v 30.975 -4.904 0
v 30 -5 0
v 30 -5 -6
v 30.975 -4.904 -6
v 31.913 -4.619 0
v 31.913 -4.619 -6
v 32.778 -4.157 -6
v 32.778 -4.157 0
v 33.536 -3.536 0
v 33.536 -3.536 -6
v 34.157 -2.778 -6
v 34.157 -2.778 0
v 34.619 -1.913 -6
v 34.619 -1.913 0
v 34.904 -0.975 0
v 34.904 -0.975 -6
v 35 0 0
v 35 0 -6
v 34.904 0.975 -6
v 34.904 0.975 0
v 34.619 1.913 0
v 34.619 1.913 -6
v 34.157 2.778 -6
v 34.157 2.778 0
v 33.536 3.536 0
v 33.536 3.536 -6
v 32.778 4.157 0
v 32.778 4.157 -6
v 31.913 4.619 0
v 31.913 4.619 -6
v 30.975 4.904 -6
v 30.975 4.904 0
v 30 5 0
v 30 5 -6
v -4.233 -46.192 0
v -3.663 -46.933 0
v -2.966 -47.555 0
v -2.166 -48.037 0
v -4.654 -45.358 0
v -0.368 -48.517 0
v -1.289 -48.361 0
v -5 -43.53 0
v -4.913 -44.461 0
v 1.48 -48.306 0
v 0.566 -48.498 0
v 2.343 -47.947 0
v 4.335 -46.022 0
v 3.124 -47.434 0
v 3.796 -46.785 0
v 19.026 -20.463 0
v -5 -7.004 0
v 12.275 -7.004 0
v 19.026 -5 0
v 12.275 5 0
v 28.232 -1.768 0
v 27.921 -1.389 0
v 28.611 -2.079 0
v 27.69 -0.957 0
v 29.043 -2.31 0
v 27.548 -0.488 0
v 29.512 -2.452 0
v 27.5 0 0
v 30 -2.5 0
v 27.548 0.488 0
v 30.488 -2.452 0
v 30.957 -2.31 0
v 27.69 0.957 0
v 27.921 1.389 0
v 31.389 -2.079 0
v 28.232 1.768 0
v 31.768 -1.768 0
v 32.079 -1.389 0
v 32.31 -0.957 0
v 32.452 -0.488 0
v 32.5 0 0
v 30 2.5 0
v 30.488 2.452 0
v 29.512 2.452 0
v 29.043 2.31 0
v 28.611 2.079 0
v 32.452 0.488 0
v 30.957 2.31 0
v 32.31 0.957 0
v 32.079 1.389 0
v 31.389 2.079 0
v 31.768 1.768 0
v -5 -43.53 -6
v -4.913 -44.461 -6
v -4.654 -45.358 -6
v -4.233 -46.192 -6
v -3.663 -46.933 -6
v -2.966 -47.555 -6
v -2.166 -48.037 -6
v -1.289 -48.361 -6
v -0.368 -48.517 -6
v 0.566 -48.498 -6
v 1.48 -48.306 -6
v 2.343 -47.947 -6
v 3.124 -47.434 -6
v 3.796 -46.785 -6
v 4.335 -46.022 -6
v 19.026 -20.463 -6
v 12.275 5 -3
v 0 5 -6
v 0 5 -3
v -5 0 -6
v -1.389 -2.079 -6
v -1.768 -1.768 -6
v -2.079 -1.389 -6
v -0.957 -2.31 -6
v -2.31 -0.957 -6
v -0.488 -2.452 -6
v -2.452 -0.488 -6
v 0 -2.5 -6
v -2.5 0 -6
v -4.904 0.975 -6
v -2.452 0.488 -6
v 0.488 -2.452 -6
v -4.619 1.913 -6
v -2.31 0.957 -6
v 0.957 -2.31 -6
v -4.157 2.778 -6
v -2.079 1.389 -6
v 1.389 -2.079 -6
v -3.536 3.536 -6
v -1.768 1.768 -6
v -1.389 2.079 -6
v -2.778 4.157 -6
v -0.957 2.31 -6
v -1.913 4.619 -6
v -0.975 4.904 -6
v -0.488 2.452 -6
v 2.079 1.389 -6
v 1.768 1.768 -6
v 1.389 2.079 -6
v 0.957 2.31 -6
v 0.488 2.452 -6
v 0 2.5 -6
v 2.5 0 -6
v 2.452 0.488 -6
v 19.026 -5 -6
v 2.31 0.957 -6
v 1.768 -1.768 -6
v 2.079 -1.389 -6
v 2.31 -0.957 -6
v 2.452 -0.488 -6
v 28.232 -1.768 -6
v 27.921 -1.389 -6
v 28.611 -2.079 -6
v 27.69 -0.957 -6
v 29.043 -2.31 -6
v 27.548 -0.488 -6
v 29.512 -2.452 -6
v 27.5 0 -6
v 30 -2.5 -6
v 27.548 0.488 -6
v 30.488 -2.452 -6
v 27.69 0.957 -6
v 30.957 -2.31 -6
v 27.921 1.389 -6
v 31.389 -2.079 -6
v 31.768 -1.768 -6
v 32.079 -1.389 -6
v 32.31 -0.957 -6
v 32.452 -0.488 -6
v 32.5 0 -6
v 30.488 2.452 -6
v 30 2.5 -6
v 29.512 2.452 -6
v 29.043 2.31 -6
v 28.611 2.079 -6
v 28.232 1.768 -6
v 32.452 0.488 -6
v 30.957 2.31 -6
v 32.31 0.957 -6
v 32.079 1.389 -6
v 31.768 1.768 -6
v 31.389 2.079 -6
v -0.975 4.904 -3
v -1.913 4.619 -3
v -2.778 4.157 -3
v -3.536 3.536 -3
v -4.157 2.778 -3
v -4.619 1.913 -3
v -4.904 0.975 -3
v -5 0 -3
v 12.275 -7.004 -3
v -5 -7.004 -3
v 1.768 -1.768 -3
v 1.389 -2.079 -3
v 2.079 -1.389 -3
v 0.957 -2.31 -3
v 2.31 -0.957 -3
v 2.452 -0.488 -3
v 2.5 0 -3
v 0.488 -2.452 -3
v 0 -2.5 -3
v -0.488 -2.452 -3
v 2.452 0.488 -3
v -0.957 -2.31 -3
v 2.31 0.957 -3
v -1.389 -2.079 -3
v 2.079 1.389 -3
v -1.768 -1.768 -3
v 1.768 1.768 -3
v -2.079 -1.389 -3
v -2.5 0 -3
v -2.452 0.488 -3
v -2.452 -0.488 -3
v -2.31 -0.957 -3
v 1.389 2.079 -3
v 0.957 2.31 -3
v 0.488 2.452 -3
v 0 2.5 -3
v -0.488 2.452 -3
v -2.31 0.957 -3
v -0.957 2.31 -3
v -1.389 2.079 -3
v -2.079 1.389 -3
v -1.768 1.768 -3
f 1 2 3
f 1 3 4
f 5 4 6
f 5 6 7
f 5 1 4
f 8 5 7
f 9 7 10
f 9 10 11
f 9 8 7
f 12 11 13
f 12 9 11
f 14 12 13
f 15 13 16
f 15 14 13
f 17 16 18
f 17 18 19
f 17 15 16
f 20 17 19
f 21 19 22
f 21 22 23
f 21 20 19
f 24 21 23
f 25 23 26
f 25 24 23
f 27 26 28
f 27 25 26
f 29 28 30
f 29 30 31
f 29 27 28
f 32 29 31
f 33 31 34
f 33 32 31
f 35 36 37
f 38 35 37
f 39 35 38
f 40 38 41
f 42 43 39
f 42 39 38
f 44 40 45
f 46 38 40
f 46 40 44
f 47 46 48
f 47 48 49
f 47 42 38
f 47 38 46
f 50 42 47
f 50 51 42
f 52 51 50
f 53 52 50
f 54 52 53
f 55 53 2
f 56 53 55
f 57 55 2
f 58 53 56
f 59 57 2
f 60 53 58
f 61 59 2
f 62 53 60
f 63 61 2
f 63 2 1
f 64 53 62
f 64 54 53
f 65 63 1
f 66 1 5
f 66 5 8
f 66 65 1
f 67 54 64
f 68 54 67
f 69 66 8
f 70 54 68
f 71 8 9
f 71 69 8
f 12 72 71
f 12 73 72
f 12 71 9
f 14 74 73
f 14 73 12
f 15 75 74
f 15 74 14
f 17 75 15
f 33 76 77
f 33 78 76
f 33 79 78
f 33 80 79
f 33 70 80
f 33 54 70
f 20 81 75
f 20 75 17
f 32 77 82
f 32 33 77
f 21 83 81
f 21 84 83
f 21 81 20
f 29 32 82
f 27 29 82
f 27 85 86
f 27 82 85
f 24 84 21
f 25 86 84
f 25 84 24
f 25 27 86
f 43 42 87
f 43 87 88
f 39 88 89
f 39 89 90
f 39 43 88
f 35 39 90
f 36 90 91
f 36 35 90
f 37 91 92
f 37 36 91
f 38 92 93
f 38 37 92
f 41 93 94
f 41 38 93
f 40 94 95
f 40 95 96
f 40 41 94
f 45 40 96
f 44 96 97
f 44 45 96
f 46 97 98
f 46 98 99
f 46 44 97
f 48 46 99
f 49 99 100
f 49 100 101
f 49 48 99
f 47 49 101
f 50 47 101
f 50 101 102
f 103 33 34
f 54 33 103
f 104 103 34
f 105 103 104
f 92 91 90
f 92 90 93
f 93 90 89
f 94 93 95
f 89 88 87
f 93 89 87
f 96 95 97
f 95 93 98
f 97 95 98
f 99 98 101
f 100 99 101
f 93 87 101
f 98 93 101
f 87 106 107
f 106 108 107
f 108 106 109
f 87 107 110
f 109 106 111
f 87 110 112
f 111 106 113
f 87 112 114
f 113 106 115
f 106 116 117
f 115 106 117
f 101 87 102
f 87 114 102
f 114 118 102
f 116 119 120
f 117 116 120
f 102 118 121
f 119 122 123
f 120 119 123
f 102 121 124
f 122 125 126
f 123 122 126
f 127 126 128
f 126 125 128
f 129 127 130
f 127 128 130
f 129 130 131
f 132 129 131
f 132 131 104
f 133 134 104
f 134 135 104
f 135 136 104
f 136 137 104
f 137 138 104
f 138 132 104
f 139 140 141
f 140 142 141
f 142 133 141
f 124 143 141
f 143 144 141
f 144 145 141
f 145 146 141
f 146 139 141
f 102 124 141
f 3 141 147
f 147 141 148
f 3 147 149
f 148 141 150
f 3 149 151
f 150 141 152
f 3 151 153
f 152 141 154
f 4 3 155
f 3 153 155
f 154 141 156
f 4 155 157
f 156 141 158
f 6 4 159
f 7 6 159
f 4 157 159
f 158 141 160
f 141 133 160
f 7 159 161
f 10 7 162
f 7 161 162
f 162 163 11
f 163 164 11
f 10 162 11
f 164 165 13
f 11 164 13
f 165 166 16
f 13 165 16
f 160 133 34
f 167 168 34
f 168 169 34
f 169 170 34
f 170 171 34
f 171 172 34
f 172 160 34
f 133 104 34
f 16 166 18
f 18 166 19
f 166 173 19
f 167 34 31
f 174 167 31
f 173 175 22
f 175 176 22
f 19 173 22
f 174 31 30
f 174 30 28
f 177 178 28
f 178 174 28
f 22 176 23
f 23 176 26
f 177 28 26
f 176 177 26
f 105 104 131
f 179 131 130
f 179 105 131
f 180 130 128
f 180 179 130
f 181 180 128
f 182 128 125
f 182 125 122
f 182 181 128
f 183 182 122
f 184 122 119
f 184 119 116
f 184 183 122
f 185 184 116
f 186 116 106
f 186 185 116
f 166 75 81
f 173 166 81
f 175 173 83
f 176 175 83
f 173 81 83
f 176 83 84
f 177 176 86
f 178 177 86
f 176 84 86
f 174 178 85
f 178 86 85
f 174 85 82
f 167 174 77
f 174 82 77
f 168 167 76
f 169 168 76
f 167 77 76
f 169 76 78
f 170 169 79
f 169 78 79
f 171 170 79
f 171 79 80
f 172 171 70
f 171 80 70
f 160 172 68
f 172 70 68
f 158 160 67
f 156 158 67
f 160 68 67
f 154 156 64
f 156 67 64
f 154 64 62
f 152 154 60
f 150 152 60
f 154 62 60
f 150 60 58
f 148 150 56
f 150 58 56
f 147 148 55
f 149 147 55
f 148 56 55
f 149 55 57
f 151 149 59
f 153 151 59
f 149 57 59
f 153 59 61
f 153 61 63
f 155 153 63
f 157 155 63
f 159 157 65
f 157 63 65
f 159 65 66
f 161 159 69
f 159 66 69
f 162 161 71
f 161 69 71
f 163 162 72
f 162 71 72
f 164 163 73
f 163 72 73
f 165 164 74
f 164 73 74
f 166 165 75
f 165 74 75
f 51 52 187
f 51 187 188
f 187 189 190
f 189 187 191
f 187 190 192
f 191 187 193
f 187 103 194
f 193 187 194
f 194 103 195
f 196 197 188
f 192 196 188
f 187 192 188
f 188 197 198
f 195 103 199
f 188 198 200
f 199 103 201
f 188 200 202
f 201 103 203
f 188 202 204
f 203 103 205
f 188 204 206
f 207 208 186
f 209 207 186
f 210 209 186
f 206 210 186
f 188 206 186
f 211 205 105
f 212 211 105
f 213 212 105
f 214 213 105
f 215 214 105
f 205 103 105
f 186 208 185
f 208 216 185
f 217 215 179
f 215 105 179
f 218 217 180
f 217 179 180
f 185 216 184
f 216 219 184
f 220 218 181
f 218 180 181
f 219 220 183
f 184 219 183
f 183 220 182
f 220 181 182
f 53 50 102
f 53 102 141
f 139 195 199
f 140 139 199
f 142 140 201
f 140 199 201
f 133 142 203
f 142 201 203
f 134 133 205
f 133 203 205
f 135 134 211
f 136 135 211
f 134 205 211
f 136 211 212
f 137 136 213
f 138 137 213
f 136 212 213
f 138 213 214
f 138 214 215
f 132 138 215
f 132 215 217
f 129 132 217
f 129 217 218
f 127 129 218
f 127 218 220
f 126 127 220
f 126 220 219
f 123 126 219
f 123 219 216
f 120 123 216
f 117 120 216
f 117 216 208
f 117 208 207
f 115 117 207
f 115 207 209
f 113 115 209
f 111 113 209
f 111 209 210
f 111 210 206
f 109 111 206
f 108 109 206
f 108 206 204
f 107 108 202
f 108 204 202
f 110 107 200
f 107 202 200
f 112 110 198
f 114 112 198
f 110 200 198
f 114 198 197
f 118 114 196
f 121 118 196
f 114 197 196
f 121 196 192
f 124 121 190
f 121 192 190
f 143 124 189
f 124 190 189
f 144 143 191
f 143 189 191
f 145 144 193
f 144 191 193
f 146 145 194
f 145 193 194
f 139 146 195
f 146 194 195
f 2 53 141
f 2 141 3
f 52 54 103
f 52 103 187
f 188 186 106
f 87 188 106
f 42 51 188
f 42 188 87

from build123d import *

# Parameters (mm, degrees)
SKETCH1_R           = 2.5
BOSS_EXTRUDE1_DEPTH = 6
CUT_EXTRUDE2_DEPTH  = 3


with BuildPart() as part:
    # Sketch1 → Boss-Extrude1 (new body)
    with BuildSketch(Plane.XY):
        with BuildLine():
            Line((30, 5), (0, 5))
            ThreePointArc((0, 5), (-3.535533906, 3.535533906), (-5, 0))
            Line((-5, 0), (-5, -43.530327794))
            ThreePointArc((-5, -43.530327794), (-1.289471128, -48.361193576), (4.334905684, -46.022032574))
            Line((4.334905684, -46.022032574), (19.026166695, -20.463133553))
            Line((19.026166695, -20.463133553), (19.026166695, -5))
            Line((19.026166695, -5), (30, -5))
            ThreePointArc((30, -5), (35, 0), (30, 5))
        make_face()
        Circle(SKETCH1_R, mode=Mode.SUBTRACT)
        with Locations((30, 0)):
            Circle(SKETCH1_R, mode=Mode.SUBTRACT)
    extrude(amount=-BOSS_EXTRUDE1_DEPTH)

    # Sketch3 → Cut-Extrude2 (cut)
    with BuildSketch(Plane.XY):
        with BuildLine():
            Line((12.275244192, 5), (12.275244192, -7.004190344))
            Line((12.275244192, -7.004190344), (-5, -7.004190344))
            Line((-5, -7.004190344), (-5, 0))
            ThreePointArc((-5, 0), (-3.535533906, 3.535533906), (0, 5))
            Line((0, 5), (12.275244192, 5))
        make_face()
    extrude(amount=-CUT_EXTRUDE2_DEPTH, mode=Mode.SUBTRACT)


solid = part.part
